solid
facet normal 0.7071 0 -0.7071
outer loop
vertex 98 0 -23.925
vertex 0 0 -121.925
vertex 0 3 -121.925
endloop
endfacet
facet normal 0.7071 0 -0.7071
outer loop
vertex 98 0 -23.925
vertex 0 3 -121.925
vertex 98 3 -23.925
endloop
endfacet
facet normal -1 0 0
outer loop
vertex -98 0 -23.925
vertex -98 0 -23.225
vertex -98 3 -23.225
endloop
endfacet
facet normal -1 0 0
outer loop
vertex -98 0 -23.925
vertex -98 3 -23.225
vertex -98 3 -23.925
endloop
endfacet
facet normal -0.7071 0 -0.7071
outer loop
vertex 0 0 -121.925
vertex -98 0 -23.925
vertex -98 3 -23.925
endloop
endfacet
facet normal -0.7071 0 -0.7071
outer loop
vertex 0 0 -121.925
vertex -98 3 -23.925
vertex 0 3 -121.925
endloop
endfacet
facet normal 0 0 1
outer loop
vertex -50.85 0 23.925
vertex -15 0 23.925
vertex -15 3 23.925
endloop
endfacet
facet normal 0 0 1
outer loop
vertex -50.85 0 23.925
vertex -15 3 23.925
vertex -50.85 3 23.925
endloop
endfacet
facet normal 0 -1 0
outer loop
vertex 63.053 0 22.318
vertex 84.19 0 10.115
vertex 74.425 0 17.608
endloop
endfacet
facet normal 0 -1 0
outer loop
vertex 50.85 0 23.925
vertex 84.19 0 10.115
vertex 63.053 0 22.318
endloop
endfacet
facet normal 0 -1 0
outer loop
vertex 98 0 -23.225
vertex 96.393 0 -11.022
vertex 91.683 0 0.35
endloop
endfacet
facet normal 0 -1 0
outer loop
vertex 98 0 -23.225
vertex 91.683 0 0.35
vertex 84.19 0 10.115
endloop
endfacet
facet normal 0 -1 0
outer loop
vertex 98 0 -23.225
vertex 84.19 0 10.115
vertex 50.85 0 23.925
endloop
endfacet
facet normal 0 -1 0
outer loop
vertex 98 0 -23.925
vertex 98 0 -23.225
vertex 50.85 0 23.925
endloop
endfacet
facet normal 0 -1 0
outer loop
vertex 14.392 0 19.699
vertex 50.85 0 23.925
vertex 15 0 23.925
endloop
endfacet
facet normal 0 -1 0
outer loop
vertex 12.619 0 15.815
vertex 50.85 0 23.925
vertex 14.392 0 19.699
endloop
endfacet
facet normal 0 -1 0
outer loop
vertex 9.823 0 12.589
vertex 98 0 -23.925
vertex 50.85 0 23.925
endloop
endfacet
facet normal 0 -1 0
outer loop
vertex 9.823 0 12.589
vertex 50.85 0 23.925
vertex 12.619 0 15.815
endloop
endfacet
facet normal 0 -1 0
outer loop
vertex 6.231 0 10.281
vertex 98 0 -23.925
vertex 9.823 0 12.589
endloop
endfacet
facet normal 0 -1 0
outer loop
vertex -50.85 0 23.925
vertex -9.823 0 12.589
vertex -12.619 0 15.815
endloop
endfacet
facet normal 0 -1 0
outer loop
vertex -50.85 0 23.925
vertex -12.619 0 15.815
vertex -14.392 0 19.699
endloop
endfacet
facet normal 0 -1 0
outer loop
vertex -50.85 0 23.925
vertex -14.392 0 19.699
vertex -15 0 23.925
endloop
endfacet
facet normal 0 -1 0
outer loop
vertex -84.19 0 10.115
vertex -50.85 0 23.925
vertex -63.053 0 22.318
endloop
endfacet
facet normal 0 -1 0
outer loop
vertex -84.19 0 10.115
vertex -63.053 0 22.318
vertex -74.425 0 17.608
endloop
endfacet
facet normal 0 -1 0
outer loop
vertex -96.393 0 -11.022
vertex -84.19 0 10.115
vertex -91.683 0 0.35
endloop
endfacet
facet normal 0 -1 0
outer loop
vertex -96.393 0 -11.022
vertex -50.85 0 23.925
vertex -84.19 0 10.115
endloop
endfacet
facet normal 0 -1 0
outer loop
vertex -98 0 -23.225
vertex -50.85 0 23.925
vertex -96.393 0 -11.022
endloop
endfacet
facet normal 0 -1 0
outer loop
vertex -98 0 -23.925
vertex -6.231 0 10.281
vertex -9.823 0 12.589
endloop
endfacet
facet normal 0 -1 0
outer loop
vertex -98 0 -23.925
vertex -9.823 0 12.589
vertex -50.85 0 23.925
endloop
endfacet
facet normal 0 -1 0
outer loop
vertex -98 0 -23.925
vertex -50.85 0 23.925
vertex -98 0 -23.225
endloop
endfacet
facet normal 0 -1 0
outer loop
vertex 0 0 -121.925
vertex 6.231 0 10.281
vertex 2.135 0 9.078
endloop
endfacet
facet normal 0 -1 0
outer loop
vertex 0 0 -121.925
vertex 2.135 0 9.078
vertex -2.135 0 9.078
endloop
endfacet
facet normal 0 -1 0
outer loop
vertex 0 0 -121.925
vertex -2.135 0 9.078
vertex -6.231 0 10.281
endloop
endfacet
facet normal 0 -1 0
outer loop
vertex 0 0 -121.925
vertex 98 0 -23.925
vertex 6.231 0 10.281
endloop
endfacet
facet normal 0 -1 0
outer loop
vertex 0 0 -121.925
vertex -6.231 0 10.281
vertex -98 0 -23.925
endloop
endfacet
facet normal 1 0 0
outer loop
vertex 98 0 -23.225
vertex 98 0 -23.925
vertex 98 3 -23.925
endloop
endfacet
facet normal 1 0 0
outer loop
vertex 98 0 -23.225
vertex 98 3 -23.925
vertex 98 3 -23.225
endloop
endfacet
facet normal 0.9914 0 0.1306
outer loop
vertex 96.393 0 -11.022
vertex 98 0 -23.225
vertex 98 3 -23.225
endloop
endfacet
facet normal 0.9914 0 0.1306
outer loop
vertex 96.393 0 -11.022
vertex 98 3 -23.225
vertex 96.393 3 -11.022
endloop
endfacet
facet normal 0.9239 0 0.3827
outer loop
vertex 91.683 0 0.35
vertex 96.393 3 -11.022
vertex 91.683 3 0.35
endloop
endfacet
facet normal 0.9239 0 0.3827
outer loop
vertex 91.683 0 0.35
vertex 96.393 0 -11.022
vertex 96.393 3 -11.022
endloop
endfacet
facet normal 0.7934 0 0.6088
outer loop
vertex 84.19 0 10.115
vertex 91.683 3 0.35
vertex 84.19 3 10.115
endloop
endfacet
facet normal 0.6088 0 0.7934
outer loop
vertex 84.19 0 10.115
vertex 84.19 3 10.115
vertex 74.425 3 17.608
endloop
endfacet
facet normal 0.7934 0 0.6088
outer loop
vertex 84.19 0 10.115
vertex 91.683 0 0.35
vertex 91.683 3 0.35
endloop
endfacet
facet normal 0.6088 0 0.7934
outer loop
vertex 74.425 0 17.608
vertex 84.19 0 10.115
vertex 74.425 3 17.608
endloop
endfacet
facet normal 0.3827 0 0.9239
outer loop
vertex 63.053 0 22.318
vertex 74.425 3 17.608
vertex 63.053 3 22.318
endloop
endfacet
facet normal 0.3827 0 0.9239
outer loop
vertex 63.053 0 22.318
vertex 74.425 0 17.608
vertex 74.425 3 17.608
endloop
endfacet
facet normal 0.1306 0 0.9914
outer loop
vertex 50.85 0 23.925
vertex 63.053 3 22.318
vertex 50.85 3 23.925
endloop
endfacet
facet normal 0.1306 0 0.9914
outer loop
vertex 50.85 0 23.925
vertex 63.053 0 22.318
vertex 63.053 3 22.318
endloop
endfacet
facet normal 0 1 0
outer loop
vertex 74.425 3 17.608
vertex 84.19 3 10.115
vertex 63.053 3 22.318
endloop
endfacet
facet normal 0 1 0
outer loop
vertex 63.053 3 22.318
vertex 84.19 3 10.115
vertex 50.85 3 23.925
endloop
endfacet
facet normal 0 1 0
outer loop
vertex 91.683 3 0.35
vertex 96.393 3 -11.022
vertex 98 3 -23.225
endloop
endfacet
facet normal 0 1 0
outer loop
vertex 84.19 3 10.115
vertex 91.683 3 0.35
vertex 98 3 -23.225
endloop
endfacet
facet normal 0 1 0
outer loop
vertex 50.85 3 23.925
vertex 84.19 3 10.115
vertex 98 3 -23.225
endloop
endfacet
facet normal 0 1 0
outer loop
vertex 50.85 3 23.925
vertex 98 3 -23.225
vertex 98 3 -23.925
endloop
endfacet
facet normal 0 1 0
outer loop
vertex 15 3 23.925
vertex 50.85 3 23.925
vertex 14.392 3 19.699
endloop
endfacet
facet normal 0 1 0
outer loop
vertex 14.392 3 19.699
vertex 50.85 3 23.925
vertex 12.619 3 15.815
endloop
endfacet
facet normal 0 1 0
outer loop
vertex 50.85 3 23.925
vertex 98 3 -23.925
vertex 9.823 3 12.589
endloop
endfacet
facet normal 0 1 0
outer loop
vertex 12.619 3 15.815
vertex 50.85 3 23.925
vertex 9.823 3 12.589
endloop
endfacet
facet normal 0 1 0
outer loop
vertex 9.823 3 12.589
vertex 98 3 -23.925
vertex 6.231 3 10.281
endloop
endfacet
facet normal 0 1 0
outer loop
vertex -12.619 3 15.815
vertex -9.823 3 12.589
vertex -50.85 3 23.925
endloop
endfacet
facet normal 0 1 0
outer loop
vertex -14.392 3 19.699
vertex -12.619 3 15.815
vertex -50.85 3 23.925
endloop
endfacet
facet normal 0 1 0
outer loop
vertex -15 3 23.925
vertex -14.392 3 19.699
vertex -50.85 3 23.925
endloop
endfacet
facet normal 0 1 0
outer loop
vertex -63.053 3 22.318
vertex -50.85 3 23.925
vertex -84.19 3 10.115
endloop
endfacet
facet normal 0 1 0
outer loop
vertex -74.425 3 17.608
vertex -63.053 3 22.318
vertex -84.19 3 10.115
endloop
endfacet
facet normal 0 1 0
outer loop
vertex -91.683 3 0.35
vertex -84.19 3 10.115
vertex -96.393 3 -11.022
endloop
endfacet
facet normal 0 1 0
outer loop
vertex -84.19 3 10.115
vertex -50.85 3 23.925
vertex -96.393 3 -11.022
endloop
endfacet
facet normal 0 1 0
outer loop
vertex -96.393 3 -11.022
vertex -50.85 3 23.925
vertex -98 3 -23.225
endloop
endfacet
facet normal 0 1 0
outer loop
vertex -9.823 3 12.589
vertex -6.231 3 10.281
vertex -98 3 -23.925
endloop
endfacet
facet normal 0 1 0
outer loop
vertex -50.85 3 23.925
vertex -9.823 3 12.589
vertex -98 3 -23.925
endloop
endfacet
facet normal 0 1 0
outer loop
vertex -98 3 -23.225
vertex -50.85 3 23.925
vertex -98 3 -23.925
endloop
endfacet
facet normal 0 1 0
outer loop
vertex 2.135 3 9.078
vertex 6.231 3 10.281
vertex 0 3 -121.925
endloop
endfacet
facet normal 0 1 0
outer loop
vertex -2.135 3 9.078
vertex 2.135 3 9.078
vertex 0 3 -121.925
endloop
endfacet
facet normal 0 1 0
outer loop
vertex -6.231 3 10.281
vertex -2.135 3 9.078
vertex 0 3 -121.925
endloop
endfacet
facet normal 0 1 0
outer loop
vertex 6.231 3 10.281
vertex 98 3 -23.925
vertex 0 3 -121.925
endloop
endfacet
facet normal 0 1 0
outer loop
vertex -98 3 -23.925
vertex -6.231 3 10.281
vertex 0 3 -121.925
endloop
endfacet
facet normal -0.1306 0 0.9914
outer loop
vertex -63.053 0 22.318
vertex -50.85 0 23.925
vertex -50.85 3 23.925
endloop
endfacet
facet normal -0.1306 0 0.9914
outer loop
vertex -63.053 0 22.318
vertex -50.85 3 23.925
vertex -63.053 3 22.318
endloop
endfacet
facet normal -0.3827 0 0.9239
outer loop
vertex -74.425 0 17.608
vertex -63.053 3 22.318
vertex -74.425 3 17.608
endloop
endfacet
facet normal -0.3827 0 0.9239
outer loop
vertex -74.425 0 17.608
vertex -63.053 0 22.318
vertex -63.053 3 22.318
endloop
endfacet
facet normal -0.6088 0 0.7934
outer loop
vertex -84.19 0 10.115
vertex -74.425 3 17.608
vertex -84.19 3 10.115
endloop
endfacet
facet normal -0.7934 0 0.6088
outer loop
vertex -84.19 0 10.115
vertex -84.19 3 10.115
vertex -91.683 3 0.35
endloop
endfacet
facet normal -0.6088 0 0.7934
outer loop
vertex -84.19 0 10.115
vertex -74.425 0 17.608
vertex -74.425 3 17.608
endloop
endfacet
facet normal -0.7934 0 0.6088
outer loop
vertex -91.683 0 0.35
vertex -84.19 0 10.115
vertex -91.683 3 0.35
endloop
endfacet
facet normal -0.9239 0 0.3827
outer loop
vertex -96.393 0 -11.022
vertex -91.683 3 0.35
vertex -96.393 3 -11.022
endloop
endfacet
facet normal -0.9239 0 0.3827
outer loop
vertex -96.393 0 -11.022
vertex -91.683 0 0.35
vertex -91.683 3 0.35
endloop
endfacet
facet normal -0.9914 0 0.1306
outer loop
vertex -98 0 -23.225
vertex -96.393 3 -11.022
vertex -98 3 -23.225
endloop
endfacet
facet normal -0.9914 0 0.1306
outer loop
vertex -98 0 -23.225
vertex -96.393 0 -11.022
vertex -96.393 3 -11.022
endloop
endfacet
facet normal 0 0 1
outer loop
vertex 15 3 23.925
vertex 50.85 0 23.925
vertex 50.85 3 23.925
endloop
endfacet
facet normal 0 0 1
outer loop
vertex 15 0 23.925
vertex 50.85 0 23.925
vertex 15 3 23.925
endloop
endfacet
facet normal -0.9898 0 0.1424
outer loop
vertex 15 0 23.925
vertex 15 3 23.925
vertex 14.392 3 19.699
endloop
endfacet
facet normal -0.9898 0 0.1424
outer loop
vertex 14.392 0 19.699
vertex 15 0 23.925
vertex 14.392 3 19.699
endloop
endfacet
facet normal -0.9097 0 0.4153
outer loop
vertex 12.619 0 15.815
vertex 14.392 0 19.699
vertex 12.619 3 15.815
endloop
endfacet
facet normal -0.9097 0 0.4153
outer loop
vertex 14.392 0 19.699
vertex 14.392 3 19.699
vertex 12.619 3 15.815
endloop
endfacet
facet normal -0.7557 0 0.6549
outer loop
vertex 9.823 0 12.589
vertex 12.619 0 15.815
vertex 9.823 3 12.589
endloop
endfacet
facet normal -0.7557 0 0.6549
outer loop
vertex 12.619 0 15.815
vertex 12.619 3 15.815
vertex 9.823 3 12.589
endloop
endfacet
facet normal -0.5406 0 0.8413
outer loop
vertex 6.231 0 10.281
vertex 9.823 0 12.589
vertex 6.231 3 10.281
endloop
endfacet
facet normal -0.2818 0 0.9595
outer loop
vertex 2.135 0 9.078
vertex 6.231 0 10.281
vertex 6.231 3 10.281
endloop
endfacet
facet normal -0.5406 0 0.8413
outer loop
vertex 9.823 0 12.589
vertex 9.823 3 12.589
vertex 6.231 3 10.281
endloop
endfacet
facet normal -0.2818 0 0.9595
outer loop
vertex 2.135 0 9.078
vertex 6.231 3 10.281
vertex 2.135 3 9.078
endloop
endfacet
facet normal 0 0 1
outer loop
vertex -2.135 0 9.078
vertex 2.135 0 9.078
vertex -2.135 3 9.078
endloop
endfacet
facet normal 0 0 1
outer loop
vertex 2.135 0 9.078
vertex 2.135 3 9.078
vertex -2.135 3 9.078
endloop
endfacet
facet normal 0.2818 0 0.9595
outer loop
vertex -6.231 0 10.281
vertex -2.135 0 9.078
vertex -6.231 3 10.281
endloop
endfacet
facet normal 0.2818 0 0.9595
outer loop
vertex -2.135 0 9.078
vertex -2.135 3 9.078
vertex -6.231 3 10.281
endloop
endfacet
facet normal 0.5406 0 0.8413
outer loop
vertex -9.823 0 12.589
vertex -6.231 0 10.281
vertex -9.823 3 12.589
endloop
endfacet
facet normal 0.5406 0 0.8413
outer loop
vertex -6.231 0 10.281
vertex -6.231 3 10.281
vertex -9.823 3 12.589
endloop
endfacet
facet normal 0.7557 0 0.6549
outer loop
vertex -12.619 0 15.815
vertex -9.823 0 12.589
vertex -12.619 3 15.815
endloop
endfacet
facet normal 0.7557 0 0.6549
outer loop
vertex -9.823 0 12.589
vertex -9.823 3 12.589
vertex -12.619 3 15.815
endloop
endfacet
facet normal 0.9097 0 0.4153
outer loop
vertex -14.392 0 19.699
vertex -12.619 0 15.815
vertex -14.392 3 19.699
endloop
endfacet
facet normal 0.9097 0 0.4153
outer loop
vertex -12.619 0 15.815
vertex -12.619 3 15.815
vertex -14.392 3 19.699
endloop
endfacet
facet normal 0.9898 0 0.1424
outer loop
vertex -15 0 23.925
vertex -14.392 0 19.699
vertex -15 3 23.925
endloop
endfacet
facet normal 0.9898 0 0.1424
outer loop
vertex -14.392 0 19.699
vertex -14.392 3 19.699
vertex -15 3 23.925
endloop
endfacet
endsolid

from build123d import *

# Parameters (mm, degrees)
BASIS_DEKSEL_DEPTH = 3
UITSPARING_DEPTH   = 157.456721252


with BuildPart() as part:
    # basis_deksel_schets → basis_deksel (new body)
    with BuildSketch(Plane(origin=(0, 0, 0), x_dir=(1, 0, 0), z_dir=(0, 1, 0))):
        with BuildLine():
            Line((-98, 23.925), (0, 121.925))
            Line((0, 121.925), (98, 23.925))
            Line((98, 23.925), (98, 23.225))
            ThreePointArc((98, 23.225), (84.190084733, -10.115084733), (50.85, -23.925))
            Line((50.85, -23.925), (-50.85, -23.925))
            ThreePointArc((-50.85, -23.925), (-84.190084733, -10.115084733), (-98, 23.225))
            Line((-98, 23.225), (-98, 23.925))
        make_face()
    extrude(amount=BASIS_DEKSEL_DEPTH)

    # uitsparing_schets → uitsparing (cut, through all)
    with BuildSketch(Plane(origin=(0, 3, 0), x_dir=(1, 0, 0), z_dir=(0, 1, 0))):
        with BuildLine():
            Line((-15, -23.925), (15, -23.925))
            ThreePointArc((15, -23.925), (0, -8.925), (-15, -23.925))
        make_face()
    extrude(amount=-UITSPARING_DEPTH, mode=Mode.SUBTRACT)


solid = part.part
